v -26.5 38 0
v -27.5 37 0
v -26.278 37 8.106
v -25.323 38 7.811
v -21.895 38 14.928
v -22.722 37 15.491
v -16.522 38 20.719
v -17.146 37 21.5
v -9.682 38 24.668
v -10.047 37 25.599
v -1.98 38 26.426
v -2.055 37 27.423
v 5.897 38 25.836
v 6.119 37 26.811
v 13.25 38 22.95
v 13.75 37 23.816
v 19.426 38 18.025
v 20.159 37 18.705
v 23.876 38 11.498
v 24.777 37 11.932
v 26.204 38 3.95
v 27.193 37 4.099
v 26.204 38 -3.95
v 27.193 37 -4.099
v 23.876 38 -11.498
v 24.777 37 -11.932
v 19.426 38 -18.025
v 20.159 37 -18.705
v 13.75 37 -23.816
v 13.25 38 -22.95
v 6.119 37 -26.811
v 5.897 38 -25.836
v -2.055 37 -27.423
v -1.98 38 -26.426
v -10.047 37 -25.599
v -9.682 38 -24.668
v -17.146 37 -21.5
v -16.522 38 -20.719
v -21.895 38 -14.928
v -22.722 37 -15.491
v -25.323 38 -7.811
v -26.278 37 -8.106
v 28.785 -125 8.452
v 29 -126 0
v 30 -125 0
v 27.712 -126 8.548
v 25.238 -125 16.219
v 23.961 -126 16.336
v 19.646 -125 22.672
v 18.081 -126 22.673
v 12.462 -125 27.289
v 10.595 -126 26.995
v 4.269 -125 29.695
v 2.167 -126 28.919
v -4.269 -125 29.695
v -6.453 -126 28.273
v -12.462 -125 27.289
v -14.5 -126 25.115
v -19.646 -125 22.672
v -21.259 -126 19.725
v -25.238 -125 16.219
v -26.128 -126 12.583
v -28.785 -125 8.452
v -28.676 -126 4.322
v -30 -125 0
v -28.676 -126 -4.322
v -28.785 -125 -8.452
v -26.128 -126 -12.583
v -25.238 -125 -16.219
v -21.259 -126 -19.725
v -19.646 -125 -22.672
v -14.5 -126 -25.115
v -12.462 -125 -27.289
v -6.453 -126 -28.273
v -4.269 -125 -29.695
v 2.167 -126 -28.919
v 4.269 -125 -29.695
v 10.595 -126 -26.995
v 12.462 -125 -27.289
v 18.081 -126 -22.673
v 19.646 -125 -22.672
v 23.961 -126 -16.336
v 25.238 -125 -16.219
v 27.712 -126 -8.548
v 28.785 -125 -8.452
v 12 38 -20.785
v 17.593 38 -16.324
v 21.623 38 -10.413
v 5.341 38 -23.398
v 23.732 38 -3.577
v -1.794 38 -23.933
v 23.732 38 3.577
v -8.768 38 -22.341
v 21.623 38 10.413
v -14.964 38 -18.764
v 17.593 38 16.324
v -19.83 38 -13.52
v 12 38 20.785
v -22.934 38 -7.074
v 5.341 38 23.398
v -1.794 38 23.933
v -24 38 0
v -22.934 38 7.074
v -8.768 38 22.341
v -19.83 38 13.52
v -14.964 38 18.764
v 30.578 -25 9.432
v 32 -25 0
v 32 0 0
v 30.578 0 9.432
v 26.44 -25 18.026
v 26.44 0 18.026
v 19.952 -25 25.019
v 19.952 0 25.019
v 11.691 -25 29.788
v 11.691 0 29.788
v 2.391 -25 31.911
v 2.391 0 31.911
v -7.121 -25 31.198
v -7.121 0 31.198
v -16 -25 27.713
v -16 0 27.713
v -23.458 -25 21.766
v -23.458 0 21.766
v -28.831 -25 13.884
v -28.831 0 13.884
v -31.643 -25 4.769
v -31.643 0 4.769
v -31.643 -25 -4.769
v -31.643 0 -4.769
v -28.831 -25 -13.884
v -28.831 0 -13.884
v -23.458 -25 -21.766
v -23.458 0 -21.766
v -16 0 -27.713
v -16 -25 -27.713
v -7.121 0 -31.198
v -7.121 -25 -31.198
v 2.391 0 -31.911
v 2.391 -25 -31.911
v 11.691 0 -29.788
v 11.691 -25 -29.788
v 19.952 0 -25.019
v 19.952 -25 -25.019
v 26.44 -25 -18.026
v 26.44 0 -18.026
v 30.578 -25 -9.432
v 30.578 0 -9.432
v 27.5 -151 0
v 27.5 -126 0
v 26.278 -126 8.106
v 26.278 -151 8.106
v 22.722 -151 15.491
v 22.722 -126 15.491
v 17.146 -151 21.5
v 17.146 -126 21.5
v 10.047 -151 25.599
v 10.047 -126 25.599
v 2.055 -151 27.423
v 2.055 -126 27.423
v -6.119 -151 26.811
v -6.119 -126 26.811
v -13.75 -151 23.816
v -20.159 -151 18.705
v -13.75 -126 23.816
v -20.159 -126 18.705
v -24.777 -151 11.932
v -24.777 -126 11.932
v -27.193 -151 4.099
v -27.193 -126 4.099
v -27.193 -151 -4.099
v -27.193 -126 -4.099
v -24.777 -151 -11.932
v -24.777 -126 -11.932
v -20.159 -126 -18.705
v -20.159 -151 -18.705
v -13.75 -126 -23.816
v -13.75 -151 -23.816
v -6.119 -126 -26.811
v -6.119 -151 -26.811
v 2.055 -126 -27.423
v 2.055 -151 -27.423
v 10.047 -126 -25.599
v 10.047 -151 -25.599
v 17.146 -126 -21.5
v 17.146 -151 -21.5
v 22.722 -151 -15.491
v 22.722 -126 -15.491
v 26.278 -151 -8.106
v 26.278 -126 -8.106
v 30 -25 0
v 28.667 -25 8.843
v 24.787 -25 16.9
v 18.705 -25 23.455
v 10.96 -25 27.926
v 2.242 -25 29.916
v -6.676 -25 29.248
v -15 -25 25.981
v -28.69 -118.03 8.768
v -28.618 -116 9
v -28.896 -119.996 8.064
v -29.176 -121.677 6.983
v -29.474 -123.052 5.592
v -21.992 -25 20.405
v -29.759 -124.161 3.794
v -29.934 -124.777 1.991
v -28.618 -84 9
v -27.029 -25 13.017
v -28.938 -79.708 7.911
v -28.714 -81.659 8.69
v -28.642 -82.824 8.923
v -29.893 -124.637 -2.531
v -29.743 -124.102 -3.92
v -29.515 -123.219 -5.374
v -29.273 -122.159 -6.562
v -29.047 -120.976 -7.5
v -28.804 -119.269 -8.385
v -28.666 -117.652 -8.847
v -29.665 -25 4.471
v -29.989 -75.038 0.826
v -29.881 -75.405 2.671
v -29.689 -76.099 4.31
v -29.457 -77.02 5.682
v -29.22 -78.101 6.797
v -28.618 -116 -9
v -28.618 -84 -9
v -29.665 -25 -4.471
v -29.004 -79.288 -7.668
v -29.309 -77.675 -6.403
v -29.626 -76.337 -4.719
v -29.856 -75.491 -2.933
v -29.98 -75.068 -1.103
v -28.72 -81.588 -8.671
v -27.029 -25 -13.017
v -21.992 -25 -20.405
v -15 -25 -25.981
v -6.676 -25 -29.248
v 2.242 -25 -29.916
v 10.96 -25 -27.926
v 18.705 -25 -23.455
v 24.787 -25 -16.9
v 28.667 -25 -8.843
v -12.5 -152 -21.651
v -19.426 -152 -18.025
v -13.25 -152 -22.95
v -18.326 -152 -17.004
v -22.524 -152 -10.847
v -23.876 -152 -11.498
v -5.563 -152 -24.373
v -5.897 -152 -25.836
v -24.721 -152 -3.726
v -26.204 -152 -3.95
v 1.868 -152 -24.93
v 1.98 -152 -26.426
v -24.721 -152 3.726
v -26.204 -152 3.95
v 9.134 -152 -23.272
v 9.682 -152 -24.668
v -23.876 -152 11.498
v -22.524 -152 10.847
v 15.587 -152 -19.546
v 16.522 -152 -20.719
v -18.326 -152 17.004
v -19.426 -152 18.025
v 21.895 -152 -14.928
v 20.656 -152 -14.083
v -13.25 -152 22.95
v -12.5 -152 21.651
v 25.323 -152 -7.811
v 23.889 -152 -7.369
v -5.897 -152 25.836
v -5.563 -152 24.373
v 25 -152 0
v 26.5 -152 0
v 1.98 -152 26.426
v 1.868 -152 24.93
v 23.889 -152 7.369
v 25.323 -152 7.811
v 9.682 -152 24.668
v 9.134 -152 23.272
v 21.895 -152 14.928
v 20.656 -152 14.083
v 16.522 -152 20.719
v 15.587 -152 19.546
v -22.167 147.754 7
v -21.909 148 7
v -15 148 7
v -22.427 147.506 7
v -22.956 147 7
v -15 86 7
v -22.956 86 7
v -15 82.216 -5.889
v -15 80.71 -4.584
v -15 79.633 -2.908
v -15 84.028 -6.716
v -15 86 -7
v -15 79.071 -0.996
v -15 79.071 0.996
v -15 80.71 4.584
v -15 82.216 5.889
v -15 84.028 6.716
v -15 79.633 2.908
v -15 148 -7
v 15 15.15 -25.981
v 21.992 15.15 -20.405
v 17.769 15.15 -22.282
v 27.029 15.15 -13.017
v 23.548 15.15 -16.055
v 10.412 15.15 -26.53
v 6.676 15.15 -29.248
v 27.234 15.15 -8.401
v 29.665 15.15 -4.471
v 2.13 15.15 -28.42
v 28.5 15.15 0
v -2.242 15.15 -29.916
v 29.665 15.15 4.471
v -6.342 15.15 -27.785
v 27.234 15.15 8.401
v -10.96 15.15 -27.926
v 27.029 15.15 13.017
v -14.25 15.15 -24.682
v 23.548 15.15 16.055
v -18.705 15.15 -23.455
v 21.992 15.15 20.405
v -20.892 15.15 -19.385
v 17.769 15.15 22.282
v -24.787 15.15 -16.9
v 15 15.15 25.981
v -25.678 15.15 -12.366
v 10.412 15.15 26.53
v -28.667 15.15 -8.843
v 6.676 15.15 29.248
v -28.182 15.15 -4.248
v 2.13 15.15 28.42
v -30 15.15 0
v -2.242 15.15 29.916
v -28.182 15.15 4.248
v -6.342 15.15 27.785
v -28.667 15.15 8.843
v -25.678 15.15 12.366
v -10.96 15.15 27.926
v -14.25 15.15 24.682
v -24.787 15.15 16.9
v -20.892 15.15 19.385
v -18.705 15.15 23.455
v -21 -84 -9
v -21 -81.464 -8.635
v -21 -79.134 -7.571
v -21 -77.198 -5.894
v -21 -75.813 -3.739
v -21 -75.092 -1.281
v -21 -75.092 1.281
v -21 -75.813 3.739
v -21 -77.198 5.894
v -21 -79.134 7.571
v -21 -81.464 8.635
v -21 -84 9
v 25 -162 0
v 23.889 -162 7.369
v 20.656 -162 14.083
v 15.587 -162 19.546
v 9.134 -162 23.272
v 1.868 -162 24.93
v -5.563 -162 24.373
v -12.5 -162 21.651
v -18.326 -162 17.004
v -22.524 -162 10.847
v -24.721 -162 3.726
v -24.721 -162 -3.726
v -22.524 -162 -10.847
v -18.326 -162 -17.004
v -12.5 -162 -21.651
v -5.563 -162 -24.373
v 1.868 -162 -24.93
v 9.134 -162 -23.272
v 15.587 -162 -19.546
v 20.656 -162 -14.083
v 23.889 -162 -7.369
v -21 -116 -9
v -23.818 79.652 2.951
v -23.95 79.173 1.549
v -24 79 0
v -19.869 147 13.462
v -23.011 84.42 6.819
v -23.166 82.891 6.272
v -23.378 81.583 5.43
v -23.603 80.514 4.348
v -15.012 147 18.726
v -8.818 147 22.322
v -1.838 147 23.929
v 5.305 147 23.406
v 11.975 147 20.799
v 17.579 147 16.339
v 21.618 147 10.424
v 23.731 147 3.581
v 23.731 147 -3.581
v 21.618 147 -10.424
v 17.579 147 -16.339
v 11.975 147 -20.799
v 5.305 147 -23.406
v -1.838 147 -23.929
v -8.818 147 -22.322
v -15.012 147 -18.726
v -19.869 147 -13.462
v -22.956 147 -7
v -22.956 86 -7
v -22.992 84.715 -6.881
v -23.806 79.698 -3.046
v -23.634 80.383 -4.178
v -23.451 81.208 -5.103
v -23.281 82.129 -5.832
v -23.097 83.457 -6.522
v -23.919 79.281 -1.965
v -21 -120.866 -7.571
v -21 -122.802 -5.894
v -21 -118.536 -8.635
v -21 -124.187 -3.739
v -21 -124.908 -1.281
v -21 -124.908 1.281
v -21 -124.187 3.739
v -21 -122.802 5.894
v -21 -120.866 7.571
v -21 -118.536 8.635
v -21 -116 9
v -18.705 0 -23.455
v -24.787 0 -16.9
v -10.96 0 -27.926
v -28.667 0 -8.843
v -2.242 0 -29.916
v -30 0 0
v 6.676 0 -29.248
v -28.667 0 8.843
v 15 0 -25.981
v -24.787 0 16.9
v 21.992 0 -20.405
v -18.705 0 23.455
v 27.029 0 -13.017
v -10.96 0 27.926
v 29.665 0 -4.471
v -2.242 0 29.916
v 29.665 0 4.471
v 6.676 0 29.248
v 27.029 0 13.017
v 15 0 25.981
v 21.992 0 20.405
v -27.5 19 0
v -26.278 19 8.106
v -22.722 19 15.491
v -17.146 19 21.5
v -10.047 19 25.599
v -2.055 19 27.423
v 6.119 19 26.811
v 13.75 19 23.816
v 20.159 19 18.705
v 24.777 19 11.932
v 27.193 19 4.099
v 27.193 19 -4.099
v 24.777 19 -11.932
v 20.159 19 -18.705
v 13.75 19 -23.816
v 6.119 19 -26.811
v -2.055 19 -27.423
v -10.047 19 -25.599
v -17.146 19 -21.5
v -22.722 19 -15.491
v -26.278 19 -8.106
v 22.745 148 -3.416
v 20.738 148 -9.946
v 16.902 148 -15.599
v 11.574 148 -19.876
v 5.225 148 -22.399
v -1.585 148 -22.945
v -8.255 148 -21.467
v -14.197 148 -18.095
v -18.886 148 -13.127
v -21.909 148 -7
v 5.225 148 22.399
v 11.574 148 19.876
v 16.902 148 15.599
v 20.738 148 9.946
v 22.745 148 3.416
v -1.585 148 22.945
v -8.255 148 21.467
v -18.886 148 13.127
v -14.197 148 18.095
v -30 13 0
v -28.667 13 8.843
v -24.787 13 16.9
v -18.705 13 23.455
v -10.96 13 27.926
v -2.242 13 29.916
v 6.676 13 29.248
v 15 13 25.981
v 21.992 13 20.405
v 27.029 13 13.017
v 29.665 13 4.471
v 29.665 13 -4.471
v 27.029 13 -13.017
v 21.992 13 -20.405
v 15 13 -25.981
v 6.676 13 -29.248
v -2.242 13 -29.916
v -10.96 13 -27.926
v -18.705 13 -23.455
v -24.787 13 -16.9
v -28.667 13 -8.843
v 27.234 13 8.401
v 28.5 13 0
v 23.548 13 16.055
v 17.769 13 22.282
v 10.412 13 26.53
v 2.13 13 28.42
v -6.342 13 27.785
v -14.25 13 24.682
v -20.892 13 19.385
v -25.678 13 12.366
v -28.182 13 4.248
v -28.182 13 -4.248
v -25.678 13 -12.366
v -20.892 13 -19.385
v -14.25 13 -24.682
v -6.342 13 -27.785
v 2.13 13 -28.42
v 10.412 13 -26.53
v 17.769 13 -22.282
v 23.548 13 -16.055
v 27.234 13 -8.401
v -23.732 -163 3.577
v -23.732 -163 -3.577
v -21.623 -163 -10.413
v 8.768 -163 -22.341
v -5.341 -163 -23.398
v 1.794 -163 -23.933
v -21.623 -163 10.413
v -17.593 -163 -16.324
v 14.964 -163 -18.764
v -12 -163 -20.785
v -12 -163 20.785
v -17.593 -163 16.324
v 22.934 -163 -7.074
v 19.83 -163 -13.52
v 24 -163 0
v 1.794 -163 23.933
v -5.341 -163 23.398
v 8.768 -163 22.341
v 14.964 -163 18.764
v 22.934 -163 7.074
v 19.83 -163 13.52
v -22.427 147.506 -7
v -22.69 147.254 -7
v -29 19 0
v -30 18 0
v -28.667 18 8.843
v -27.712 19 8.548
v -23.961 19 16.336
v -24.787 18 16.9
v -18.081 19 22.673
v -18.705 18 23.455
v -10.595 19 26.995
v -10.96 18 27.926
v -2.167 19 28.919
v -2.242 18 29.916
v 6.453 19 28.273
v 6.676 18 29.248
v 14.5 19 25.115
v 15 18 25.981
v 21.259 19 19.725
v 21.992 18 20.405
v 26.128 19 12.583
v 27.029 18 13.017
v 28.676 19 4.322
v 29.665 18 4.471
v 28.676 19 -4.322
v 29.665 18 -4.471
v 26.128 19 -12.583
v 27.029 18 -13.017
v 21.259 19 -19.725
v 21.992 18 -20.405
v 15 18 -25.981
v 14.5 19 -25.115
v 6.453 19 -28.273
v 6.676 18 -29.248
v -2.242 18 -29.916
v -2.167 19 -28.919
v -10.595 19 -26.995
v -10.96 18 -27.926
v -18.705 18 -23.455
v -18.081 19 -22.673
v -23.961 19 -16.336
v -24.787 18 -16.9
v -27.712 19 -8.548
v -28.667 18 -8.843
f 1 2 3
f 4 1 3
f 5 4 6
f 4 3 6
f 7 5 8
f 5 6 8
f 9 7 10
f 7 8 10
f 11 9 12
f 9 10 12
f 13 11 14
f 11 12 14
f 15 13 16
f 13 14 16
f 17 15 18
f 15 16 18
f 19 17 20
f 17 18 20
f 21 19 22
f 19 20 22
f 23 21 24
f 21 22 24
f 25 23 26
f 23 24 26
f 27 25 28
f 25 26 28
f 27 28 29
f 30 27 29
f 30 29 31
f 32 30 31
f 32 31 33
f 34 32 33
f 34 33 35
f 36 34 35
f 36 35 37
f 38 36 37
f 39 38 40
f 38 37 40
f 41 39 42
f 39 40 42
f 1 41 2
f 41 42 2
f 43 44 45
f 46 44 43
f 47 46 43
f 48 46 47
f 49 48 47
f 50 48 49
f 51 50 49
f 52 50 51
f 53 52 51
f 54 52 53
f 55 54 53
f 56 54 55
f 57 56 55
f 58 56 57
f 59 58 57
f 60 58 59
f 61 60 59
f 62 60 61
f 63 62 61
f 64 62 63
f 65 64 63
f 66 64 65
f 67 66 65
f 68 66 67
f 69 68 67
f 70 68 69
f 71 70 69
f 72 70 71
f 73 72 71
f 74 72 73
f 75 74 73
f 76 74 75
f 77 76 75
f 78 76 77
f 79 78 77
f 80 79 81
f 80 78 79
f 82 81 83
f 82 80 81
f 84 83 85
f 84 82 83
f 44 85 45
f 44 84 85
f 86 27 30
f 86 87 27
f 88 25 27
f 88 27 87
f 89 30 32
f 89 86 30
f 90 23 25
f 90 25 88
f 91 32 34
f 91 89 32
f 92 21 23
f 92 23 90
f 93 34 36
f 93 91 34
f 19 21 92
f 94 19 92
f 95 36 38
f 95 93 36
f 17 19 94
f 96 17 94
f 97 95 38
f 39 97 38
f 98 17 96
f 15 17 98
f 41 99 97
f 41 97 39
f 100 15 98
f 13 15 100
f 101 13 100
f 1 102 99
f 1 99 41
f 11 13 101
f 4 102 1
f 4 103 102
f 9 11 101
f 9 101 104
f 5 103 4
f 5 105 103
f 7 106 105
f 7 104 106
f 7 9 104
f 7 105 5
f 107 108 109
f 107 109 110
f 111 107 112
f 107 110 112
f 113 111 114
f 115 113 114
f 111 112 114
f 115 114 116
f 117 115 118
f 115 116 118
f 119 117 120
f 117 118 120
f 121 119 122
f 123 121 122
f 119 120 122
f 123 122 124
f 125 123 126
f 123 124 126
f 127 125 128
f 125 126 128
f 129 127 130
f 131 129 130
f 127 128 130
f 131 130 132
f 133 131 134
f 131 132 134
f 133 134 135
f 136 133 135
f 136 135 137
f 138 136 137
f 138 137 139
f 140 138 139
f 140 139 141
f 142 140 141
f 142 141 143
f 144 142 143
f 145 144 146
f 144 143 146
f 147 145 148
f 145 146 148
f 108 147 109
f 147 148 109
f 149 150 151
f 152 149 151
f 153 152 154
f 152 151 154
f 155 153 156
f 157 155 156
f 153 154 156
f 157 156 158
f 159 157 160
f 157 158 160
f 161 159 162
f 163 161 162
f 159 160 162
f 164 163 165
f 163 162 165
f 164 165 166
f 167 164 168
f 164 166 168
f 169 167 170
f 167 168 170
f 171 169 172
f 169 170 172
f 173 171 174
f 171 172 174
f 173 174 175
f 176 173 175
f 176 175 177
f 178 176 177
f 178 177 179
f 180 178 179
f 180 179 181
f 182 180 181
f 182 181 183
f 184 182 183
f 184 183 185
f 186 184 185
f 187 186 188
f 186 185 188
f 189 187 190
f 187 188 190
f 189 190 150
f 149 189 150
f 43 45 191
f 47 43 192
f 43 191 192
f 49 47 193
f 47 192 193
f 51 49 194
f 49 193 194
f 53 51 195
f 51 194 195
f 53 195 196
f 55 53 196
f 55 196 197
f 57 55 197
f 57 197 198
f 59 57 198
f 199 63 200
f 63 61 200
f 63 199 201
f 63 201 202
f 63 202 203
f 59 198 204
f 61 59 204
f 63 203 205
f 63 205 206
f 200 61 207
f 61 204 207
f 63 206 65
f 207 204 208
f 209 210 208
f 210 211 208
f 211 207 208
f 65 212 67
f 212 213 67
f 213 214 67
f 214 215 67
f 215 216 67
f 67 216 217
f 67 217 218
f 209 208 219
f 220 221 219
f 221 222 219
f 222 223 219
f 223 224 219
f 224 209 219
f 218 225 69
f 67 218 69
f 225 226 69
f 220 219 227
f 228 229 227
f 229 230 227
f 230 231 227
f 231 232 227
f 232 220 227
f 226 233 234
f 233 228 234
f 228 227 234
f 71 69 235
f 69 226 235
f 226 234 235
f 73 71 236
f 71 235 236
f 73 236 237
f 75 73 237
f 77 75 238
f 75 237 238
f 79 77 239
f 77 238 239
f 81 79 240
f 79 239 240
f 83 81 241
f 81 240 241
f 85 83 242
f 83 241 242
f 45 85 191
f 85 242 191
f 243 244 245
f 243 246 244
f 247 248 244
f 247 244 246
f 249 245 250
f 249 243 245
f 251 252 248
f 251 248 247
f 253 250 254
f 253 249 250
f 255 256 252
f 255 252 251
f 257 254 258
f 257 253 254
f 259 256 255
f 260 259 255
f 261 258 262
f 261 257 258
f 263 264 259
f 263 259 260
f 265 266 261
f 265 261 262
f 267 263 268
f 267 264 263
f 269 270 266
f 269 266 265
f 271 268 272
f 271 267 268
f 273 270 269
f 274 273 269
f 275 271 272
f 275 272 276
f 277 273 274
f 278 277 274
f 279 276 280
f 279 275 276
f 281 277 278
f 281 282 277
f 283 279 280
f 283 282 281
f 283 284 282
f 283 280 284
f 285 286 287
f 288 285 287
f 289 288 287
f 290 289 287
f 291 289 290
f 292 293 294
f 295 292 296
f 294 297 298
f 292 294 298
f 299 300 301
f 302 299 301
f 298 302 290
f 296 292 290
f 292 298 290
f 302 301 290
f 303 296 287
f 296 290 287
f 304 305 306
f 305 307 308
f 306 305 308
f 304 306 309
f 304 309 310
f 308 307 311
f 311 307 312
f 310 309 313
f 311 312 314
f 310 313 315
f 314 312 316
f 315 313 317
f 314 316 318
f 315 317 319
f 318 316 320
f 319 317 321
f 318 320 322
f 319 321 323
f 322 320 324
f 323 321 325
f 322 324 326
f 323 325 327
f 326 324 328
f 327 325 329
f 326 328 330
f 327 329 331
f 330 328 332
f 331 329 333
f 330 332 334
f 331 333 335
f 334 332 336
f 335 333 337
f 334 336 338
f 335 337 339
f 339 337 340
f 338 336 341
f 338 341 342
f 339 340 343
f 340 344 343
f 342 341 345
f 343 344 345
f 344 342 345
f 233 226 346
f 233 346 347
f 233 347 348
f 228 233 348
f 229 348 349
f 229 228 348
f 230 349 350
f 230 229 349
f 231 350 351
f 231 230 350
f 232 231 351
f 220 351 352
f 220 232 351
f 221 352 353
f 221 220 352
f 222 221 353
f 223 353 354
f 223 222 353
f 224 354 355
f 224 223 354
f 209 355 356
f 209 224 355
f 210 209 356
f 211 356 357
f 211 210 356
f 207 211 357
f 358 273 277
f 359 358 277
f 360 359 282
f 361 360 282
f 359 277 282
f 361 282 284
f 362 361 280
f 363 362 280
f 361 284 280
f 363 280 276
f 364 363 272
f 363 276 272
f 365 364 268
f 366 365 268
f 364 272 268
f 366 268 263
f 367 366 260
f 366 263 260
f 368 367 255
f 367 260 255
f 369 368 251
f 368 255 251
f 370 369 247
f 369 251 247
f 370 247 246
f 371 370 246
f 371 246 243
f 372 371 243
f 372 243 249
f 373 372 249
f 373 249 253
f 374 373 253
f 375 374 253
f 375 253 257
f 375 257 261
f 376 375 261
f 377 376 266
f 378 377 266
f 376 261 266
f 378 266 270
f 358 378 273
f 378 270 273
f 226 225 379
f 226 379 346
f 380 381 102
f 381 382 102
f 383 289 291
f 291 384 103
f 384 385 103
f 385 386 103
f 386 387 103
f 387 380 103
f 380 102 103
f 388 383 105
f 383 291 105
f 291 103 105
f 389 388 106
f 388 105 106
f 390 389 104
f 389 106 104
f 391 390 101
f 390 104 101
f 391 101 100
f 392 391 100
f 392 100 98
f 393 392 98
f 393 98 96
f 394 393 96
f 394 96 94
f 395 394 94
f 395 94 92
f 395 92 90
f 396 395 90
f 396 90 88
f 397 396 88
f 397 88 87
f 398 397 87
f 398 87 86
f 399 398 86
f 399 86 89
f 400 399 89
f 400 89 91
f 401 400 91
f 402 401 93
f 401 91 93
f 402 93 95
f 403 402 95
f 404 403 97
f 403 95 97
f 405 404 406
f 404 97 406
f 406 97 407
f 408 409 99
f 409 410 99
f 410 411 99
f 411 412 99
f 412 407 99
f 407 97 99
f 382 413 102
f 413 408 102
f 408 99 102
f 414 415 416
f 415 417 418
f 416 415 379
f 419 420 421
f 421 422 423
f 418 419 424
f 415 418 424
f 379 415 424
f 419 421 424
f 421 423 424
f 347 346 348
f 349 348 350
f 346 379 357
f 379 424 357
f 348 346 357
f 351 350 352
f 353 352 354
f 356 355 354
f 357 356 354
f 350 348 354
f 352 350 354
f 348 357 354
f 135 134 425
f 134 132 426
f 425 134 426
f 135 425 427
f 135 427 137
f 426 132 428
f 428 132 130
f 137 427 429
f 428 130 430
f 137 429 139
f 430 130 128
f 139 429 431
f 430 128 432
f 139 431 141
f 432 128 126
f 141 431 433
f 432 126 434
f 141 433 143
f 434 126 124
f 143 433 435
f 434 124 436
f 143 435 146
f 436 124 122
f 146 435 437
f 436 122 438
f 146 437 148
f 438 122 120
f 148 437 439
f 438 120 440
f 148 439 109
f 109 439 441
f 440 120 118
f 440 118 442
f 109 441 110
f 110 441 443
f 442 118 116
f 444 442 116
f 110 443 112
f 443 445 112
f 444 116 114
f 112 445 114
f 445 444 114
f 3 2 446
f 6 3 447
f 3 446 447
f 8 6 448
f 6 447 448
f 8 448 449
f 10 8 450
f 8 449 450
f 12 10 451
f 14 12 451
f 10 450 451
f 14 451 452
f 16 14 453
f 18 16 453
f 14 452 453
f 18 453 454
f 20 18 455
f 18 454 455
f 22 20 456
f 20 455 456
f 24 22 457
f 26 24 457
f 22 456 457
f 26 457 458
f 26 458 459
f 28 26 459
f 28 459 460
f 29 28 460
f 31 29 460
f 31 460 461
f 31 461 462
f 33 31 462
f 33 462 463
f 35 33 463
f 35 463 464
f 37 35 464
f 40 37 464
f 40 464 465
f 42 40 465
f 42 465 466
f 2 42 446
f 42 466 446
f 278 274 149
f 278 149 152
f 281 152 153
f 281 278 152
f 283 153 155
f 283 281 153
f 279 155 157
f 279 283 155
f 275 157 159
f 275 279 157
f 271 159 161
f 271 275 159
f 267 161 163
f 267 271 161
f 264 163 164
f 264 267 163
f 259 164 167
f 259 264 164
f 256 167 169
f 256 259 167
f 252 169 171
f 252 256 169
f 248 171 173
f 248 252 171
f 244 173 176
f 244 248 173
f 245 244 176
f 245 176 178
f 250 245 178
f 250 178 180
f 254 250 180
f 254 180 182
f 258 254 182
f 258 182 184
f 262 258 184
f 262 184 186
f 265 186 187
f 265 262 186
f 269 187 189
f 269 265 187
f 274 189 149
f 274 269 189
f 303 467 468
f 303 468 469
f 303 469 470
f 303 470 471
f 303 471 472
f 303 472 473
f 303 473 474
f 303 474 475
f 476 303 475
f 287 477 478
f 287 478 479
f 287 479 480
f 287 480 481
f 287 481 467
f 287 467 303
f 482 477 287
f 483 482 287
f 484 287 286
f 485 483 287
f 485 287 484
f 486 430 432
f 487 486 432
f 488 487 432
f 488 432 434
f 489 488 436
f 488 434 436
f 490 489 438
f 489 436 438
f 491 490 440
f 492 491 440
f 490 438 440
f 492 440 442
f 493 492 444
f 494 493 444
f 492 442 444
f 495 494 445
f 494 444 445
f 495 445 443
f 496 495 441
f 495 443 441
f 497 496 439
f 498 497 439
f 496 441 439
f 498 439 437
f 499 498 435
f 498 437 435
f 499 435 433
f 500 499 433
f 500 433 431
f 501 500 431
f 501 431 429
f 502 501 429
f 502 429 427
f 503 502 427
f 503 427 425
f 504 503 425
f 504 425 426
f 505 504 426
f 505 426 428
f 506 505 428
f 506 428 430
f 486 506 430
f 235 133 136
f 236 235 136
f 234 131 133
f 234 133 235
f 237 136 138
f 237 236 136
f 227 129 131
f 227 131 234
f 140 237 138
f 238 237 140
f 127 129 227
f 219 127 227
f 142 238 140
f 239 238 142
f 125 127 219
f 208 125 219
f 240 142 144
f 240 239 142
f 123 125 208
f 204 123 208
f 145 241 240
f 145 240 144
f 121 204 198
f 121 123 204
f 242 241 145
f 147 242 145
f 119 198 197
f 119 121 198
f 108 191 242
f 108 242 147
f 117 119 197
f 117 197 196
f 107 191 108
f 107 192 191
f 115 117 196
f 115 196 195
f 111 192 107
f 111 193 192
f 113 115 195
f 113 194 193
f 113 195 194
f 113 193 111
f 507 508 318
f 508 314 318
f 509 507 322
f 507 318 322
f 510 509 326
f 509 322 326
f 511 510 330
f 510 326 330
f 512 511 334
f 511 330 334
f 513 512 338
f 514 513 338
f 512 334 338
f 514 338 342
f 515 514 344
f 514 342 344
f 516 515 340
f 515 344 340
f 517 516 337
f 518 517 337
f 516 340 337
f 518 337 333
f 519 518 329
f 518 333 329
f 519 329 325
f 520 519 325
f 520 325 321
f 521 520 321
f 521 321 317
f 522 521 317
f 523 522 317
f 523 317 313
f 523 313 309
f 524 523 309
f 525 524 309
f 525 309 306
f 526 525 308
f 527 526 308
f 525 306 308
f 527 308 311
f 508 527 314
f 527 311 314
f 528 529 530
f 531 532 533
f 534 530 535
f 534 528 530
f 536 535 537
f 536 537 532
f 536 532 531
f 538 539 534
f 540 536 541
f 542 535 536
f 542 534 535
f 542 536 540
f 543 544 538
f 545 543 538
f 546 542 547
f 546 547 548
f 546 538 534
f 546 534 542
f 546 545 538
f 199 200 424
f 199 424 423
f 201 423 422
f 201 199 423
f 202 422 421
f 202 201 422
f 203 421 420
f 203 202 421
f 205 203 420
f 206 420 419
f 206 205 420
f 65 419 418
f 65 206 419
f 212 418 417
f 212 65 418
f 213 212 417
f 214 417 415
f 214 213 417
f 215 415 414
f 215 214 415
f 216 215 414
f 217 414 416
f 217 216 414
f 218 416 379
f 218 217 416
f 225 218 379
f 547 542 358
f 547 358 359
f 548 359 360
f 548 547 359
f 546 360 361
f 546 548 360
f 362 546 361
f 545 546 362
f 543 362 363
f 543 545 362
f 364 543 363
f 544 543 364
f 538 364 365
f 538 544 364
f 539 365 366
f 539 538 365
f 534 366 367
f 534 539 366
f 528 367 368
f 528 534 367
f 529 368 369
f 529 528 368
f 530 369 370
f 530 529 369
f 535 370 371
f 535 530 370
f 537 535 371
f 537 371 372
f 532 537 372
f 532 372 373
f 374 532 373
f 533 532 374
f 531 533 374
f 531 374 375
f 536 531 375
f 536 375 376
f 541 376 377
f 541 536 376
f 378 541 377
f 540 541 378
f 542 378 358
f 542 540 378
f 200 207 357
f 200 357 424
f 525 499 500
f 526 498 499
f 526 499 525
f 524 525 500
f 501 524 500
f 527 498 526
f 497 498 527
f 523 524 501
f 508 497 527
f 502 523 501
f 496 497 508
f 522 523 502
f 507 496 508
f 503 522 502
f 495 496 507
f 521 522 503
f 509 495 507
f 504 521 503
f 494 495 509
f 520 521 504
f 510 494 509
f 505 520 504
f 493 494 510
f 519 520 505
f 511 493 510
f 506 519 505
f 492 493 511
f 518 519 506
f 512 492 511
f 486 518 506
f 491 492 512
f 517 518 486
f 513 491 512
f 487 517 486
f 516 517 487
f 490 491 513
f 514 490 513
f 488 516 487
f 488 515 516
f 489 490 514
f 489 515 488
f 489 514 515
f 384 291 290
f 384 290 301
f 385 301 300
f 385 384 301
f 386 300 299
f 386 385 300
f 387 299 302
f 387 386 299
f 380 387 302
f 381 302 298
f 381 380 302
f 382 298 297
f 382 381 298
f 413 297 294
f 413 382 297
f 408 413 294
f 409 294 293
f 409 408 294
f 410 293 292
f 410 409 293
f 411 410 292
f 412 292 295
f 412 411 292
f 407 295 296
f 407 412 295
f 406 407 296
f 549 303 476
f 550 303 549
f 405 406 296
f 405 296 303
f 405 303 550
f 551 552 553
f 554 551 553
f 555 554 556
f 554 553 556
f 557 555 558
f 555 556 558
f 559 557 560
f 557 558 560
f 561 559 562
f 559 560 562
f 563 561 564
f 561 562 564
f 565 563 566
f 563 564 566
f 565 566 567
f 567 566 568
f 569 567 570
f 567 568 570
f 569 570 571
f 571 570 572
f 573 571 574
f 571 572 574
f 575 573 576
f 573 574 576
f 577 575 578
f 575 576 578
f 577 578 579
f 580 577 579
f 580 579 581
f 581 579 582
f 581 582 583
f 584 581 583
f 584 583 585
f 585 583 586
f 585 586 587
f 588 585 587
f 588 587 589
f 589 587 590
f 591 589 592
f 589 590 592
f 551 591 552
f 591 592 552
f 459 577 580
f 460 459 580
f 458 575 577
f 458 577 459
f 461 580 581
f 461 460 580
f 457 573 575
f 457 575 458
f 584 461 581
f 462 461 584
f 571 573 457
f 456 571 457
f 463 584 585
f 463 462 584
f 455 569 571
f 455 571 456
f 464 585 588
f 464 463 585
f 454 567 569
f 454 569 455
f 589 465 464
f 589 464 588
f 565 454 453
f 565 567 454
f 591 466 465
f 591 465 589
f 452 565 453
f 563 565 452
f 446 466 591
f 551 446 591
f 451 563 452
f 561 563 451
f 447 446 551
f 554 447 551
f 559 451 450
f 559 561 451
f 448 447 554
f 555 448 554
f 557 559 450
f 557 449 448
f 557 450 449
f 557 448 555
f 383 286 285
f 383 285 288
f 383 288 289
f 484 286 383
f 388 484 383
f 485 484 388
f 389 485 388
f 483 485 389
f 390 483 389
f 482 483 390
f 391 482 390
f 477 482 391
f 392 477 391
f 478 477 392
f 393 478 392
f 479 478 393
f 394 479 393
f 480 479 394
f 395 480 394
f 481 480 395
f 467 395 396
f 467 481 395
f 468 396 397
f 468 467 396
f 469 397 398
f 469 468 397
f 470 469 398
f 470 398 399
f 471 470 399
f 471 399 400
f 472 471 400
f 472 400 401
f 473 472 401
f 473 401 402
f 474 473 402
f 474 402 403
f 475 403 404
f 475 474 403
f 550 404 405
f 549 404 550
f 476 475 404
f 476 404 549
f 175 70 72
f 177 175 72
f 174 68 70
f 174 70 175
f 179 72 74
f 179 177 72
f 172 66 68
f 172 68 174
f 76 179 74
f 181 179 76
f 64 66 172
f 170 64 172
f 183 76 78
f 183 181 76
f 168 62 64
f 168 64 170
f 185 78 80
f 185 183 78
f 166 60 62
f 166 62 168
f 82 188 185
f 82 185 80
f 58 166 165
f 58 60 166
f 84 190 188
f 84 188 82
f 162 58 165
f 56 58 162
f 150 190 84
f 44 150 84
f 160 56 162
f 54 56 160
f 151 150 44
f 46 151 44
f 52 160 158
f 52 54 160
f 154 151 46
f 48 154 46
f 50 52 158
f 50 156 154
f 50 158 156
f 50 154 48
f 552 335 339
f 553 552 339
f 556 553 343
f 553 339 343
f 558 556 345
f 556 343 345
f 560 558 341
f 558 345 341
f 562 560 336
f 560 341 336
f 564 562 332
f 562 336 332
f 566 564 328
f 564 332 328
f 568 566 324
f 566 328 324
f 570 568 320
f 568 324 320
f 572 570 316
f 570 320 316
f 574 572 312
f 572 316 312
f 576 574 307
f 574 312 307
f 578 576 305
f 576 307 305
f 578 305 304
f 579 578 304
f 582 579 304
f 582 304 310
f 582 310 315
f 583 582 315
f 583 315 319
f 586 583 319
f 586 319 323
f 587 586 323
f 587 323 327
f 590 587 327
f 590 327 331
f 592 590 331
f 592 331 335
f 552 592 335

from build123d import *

# Parameters (mm, degrees)
F0_R      = 32
F1_DEPTH  = 25
F2_R      = 30
F3_DEPTH  = 101
F4_R      = 27.5
F5_DEPTH  = 26
F6_R      = 25
F7_DEPTH  = 11
F8_R      = 30
F9_DEPTH  = 19
F10_R     = 27.5
F11_DEPTH = 19
F12_R     = 24
F13_DEPTH = 110
F14_SIZE  = 1
F15_SIZE  = 1
F16_SIZE  = 1
F17_W     = 1.5
F17_H     = 2.15
F19_SIZE  = 1
F20_SIZE  = 1
F21_SIZE  = 1
F24_DEPTH = 9
F27_DEPTH = 9


with BuildPart() as f1:
    # F0 (on Front) → F1 (new body)
    with BuildSketch(Plane.XZ):
        Circle(F0_R)
    extrude(amount=F1_DEPTH)

    # F2 (on face) → F3 (join)
    with BuildSketch(Plane.XZ.offset(25)):
        Circle(F2_R)
    extrude(amount=F3_DEPTH)

    # F4 (on face) → F5 (join)
    with BuildSketch(Plane.XZ.offset(126)):
        Circle(F4_R)
    extrude(amount=F5_DEPTH)

    # F6 (on face) → F7 (join)
    with BuildSketch(Plane.XZ.offset(152)):
        Circle(F6_R)
    extrude(amount=F7_DEPTH)

    # F8 (on face) → F9 (join)
    with BuildSketch(Plane(origin=(0, 0, 0), x_dir=(-1, 0, 0), z_dir=(0, 1, 0))):
        Circle(F8_R)
    extrude(amount=F9_DEPTH)

    # F10 (on face) → F11 (join)
    with BuildSketch(Plane(origin=(0, 19, 0), x_dir=(-1, 0, 0), z_dir=(0, 1, 0))):
        Circle(F10_R)
    extrude(amount=F11_DEPTH)

    # F12 (on face) → F13 (join)
    with BuildSketch(Plane(origin=(0, 38, 0), x_dir=(-1, 0, 0), z_dir=(0, 1, 0))):
        Circle(F12_R)
    extrude(amount=F13_DEPTH)

    # F14
    f14_edges = [f1.edges().sort_by_distance(p)[0] for p in [
        (24, 148, 0),
    ]]
    chamfer(f14_edges, length=F14_SIZE)

    # F15
    f15_edges = [f1.edges().sort_by_distance(p)[0] for p in [
        (27.5, 38, 0),
    ]]
    chamfer(f15_edges, length=F15_SIZE)

    # F16
    f16_edges = [f1.edges().sort_by_distance(p)[0] for p in [
        (30, 19, 0),
    ]]
    chamfer(f16_edges, length=F16_SIZE)

    # F17 (on Top) → F18 (revolve, cut)
    with BuildSketch(Plane.XY):
        with Locations((29.25, 14.075)):
            Rectangle(F17_W, F17_H)
    revolve(axis=Axis((0, 0, 0), (0, -1, 0)), mode=Mode.SUBTRACT)

    # F19
    f19_edges = [f1.edges().sort_by_distance(p)[0] for p in [
        (-30, -126, 0),
    ]]
    chamfer(f19_edges, length=F19_SIZE)

    # F20
    f20_edges = [f1.edges().sort_by_distance(p)[0] for p in [
        (-27.5, -152, 0),
    ]]
    chamfer(f20_edges, length=F20_SIZE)

    # F21
    f21_edges = [f1.edges().sort_by_distance(p)[0] for p in [
        (-25, -163, 0),
    ]]
    chamfer(f21_edges, length=F21_SIZE)

    # F23 (on offset) → F24 (cut)
    with BuildSketch(Plane.YZ.offset(-24)):
        with BuildLine():
            Line((148, -7), (148, 7))
            Line((148, 7), (86, 7))
            ThreePointArc((86, 7), (79, 0), (86, -7))
            Line((86, -7), (148, -7))
        make_face()
    extrude(amount=F24_DEPTH, mode=Mode.SUBTRACT)

    # F26 (on offset) → F27 (cut)
    with BuildSketch(Plane.YZ.offset(-30)):
        with BuildLine():
            ThreePointArc((-84, -9), (-75, 0), (-84, 9))
            Line((-84, 9), (-116, 9))
            ThreePointArc((-116, 9), (-125, 0), (-116, -9))
            Line((-116, -9), (-84, -9))
        make_face()
    extrude(amount=F27_DEPTH, mode=Mode.SUBTRACT)


solid = f1.part
